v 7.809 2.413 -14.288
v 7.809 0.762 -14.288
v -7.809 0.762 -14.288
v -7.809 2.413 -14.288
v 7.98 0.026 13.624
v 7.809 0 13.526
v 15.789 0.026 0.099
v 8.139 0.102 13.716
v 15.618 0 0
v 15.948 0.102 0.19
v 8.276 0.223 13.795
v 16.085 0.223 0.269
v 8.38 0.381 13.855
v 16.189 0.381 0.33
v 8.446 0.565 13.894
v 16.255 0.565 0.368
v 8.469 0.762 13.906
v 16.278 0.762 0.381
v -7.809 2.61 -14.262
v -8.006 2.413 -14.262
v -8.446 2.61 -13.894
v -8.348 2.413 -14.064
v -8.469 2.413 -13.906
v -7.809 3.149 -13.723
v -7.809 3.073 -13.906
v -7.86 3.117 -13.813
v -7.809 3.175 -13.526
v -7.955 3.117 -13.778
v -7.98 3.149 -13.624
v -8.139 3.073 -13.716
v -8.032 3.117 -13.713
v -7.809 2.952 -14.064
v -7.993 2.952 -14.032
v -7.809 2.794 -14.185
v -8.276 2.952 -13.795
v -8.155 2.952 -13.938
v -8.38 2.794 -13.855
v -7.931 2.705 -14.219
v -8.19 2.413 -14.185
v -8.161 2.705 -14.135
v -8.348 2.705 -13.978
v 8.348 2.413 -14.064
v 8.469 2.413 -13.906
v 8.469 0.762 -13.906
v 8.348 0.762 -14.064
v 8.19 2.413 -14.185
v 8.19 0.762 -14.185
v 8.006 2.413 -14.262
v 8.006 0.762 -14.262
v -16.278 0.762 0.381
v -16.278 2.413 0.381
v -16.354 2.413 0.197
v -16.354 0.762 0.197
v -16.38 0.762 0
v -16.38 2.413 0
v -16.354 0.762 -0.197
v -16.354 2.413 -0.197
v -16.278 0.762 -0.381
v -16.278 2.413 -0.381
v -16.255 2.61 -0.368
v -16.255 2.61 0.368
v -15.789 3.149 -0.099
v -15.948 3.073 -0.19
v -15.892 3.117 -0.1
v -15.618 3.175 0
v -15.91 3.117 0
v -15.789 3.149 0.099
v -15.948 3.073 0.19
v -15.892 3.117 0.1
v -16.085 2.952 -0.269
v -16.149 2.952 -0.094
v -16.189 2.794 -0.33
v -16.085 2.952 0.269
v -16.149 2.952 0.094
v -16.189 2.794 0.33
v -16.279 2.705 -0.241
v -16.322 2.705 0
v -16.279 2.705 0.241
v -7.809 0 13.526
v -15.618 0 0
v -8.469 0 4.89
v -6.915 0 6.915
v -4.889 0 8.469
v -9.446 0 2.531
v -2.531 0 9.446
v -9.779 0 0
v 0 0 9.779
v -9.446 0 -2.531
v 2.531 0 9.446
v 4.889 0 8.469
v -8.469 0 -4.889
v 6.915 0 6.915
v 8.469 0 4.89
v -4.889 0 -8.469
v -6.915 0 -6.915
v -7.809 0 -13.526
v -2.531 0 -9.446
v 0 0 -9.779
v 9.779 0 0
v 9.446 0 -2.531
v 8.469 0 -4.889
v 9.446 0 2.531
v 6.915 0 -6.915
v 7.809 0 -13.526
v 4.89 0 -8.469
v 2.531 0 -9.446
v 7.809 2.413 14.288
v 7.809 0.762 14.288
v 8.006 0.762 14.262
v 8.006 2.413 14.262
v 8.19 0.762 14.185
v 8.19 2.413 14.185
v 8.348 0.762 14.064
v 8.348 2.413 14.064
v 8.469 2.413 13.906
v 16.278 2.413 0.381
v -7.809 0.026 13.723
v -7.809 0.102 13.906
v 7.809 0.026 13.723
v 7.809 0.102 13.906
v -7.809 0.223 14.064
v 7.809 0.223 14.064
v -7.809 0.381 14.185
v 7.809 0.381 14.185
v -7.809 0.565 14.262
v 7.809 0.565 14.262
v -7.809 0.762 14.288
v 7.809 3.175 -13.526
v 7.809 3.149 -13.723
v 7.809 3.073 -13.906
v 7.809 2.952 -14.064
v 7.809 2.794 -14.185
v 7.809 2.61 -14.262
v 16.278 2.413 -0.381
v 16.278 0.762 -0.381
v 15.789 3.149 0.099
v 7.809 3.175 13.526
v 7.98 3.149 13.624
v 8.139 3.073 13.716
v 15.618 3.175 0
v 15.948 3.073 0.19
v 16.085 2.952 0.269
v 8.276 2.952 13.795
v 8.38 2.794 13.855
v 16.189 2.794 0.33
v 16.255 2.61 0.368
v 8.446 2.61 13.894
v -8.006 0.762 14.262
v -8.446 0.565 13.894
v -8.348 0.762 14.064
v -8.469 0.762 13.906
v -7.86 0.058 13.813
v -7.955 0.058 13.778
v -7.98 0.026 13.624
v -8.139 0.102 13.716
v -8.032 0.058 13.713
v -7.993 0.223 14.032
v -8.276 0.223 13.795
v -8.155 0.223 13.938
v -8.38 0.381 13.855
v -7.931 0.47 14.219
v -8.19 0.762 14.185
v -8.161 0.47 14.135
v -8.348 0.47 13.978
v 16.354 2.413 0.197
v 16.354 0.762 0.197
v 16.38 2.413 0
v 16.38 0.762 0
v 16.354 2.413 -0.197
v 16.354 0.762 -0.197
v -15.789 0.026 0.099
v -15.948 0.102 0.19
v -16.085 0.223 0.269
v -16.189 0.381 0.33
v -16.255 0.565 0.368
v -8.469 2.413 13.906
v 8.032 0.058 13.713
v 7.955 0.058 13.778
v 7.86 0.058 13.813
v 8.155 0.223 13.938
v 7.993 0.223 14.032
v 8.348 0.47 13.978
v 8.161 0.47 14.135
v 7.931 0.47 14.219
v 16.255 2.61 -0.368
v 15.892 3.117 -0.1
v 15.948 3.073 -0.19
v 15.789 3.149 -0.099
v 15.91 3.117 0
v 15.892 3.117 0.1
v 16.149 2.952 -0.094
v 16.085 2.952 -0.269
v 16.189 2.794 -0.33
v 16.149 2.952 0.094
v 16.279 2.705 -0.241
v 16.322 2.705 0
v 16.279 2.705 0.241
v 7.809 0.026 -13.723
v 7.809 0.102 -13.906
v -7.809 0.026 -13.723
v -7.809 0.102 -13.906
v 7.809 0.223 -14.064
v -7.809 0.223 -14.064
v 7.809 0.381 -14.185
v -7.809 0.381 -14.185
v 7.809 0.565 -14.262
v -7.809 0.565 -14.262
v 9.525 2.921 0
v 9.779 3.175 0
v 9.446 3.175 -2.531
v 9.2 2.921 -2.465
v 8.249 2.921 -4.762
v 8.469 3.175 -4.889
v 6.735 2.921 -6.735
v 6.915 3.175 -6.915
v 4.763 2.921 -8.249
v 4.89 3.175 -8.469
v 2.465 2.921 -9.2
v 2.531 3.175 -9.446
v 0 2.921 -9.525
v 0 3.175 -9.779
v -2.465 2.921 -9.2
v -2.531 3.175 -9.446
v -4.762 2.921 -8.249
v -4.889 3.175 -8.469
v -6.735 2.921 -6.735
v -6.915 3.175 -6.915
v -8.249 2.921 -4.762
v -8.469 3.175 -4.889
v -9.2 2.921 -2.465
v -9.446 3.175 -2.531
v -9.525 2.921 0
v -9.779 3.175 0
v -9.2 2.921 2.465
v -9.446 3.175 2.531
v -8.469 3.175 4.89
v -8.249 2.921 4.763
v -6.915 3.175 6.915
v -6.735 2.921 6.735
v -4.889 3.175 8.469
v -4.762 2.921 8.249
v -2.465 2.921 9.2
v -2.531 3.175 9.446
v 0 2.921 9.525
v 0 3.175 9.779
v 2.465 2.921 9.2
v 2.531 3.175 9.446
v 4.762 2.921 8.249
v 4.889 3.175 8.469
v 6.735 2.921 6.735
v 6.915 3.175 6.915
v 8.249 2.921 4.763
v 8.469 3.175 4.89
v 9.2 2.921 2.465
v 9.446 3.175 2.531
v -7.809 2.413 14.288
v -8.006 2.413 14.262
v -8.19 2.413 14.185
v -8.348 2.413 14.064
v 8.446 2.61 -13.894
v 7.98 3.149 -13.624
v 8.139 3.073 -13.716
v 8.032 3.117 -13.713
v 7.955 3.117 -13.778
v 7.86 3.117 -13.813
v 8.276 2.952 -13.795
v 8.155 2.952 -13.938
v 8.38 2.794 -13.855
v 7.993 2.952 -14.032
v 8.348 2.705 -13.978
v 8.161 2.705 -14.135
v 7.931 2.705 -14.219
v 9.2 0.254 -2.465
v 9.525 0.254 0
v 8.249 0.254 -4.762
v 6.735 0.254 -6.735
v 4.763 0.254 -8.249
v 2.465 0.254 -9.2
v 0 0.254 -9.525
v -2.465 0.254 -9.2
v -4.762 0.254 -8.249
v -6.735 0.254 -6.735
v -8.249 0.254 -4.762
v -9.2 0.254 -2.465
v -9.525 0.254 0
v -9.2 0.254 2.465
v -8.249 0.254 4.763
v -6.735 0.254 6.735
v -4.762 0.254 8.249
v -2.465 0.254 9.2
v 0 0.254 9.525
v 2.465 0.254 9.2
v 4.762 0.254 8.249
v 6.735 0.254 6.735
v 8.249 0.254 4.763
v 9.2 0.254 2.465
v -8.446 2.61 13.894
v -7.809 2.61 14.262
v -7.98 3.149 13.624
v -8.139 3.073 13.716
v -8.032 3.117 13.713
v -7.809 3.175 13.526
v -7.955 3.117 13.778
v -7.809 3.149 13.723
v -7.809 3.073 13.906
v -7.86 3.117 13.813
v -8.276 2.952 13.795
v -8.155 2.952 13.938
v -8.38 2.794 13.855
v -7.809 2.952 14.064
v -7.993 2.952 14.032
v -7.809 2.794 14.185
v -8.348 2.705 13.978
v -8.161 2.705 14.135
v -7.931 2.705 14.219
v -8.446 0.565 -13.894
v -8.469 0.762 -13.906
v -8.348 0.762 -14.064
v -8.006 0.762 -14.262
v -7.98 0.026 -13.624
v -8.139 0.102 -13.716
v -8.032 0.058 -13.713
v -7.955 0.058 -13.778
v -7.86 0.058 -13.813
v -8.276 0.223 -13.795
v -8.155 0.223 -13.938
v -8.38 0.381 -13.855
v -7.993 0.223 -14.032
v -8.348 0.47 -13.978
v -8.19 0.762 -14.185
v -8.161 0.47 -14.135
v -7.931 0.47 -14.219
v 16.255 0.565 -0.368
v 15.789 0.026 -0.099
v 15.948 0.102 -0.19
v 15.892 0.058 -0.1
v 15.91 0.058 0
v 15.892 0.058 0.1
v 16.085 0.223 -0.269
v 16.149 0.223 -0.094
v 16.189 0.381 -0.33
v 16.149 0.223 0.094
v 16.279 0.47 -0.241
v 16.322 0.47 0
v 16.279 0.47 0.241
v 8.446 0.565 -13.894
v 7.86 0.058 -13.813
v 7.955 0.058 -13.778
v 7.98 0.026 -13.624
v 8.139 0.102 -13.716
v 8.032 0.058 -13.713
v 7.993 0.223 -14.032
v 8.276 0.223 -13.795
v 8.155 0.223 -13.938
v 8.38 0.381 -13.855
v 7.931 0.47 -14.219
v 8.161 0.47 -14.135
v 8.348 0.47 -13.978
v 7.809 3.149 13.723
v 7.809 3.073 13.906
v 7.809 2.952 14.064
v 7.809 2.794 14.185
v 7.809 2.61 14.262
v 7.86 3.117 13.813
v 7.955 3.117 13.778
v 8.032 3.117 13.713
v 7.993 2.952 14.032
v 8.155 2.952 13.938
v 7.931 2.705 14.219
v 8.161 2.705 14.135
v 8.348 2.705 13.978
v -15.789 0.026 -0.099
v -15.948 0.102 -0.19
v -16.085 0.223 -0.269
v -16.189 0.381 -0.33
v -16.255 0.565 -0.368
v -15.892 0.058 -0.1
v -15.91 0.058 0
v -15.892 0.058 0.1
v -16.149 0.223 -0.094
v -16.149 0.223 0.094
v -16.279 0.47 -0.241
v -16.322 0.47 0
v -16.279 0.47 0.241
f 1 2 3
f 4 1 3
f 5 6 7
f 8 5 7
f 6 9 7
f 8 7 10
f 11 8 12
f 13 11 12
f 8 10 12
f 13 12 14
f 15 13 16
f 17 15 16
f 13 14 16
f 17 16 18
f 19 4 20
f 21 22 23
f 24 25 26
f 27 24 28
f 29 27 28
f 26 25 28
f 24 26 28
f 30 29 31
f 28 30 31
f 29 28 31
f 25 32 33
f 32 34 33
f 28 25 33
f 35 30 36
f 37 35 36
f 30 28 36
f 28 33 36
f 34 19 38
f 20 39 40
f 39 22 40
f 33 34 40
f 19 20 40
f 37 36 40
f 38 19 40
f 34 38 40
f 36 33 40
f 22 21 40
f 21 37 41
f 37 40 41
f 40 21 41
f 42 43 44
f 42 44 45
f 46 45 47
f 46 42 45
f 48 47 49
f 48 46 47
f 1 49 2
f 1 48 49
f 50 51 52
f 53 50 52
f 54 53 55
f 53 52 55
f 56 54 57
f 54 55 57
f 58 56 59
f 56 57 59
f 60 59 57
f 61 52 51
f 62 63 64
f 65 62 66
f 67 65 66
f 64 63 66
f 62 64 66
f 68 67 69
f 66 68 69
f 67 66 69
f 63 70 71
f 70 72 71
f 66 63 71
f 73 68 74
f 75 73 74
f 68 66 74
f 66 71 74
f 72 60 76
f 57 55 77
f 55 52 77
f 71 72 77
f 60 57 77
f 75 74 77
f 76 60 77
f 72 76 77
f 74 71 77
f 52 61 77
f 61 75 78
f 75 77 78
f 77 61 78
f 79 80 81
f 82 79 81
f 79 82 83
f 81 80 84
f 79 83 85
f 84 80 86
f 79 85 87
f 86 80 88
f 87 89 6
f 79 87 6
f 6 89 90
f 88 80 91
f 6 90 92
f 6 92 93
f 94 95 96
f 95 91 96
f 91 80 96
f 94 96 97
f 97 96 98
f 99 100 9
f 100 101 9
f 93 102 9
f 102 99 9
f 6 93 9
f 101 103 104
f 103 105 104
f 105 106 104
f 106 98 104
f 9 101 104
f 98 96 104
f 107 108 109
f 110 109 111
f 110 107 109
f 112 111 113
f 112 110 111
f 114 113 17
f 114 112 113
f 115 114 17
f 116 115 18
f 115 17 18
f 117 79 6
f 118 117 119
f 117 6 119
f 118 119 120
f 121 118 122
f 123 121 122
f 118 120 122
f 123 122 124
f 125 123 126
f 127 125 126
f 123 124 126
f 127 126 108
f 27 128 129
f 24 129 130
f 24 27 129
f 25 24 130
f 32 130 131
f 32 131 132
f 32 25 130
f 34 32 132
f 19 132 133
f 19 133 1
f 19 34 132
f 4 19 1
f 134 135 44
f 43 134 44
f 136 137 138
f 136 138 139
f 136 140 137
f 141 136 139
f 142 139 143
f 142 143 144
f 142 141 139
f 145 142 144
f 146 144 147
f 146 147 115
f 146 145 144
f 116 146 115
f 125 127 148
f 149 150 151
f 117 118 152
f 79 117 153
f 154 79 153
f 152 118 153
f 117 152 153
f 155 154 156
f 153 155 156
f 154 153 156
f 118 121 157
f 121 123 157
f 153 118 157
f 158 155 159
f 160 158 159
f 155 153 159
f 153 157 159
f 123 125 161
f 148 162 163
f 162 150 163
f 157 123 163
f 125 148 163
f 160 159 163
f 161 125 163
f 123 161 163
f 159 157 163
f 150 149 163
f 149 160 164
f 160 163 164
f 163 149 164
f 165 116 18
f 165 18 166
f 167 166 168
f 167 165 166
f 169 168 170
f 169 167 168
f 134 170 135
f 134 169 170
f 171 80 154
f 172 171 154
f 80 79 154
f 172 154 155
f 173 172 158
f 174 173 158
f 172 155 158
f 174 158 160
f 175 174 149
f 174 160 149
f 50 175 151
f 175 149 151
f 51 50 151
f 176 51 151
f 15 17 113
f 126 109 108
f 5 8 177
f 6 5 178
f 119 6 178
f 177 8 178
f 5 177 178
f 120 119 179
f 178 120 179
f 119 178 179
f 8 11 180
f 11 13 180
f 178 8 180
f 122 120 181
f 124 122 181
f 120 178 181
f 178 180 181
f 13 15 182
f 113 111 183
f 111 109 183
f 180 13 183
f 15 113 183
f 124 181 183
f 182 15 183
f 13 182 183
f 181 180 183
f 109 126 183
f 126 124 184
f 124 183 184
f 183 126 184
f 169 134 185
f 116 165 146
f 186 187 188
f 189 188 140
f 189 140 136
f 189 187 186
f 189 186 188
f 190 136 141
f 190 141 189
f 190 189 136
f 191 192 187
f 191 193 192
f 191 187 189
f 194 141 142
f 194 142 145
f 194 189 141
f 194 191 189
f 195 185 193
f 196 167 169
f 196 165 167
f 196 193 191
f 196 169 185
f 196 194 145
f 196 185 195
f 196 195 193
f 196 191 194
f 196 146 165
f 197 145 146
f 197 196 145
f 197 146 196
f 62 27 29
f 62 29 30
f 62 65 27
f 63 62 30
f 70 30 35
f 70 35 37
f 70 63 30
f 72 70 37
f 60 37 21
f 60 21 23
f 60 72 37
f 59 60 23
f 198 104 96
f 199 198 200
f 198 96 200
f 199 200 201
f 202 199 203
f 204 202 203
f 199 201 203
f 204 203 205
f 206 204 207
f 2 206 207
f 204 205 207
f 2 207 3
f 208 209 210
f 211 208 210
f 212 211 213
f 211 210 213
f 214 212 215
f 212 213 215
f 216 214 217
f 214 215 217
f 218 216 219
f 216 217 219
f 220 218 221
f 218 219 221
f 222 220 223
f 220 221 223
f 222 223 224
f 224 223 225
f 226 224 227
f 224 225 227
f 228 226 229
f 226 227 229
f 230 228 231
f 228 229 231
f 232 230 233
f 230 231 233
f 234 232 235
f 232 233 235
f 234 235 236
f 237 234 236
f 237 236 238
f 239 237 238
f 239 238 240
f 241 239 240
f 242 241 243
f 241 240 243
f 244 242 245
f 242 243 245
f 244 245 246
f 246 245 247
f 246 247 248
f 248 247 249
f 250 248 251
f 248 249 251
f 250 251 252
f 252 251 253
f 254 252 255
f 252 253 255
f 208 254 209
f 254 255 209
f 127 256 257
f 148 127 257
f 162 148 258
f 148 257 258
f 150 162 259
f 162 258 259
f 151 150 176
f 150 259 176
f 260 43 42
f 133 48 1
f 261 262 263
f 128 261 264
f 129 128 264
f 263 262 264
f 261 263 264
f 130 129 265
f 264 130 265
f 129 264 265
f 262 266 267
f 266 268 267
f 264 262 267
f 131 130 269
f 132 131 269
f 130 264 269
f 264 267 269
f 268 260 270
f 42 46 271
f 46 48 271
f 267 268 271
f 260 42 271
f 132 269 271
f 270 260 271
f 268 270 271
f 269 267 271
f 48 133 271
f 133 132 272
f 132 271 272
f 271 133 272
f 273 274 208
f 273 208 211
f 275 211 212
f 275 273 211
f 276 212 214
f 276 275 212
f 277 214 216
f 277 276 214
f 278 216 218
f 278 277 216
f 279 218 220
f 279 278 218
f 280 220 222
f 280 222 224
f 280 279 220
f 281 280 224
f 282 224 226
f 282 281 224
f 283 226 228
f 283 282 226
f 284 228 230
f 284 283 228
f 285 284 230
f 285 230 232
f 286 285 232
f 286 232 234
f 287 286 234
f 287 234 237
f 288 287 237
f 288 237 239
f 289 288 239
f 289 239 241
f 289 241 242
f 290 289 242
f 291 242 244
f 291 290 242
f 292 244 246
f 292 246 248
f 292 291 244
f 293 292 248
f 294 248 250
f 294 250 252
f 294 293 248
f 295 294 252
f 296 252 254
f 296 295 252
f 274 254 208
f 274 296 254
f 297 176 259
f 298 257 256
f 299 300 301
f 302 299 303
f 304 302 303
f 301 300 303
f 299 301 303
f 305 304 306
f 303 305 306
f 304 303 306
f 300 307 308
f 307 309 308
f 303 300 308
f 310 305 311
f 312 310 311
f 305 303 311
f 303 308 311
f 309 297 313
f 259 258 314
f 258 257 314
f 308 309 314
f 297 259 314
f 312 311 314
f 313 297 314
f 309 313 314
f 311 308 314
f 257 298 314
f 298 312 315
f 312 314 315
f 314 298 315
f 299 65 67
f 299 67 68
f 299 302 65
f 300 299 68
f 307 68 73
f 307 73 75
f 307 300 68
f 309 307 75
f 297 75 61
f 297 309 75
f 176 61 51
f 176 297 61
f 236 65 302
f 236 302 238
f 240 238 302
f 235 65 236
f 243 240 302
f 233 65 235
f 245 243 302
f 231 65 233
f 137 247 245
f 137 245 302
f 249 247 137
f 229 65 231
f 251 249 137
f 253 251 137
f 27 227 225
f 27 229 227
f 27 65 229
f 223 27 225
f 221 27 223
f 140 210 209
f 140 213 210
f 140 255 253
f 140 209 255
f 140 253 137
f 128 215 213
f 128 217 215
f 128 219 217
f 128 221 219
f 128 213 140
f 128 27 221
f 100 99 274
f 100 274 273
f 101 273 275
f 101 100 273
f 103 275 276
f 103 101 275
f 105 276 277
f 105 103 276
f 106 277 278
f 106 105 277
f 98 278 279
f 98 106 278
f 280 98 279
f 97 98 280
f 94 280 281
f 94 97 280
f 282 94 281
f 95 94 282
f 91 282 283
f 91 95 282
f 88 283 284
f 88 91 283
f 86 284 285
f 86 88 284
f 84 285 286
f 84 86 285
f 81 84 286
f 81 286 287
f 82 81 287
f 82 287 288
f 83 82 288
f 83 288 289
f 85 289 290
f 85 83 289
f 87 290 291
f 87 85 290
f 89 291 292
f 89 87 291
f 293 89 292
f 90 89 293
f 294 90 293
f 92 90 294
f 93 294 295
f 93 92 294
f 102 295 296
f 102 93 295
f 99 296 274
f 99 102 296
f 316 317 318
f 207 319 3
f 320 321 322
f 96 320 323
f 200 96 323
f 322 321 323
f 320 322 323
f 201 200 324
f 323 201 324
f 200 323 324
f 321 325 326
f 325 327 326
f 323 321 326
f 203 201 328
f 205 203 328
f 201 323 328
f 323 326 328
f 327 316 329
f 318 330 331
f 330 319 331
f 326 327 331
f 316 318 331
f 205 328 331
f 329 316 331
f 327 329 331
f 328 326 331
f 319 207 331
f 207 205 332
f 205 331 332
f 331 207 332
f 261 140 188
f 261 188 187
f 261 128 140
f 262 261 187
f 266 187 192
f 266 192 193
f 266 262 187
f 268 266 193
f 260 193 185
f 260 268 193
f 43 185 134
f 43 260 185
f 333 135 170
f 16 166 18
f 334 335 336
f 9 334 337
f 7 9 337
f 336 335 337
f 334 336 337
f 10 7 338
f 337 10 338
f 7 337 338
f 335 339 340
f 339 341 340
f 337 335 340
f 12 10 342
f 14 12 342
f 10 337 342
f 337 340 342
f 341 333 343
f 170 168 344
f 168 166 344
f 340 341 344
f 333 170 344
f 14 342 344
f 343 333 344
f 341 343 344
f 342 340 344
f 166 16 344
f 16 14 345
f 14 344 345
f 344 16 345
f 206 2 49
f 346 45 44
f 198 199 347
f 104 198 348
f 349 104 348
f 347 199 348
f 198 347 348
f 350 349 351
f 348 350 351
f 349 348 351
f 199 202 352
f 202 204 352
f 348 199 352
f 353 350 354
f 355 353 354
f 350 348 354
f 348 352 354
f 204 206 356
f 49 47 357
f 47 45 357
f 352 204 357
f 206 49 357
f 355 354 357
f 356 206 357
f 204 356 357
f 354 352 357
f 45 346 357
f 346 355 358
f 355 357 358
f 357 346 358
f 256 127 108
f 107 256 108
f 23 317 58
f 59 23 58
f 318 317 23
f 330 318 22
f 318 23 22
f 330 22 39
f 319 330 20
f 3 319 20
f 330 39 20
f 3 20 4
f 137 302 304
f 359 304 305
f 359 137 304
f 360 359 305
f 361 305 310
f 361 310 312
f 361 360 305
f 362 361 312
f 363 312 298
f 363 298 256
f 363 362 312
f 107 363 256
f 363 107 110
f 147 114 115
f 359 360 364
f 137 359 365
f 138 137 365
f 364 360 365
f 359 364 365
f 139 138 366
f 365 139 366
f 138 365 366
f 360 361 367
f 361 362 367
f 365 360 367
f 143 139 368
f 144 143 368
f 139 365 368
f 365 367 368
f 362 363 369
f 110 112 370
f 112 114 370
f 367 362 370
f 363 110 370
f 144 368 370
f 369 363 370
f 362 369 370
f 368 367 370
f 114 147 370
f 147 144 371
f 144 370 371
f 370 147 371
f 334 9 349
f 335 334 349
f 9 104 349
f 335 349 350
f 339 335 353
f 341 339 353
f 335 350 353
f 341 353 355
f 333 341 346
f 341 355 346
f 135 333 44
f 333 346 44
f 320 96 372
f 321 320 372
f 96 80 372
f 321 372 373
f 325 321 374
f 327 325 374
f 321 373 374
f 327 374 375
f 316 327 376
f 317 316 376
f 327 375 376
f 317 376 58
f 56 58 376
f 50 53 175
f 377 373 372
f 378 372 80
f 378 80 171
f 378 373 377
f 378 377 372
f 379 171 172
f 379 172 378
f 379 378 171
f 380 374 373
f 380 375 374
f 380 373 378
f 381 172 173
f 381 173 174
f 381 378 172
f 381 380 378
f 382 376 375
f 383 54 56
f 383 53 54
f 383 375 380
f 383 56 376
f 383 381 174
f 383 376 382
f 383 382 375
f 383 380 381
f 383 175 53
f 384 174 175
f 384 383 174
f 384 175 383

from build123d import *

# Parameters (mm, degrees)
SKETCH1_R           = 9.525
BOSS_EXTRUDE1_DEPTH = 3.175
CHAMFER1_SIZE       = 0.254
FILLET1_R           = 0.762


with BuildPart() as part:
    # Sketch1 → Boss-Extrude1 (new body)
    with BuildSketch(Plane(origin=(0, 0, 0), x_dir=(1, 0, 0), z_dir=(0, 1, 0))):
        Polygon((-8.248891971, -14.2875), (8.248891971, -14.2875), (16.497783942, 0), (8.248891971, 14.2875), (-8.248891971, 14.2875), (-16.497783942, 0), align=None)
        Circle(SKETCH1_R, mode=Mode.SUBTRACT)
    extrude(amount=BOSS_EXTRUDE1_DEPTH)

    # Chamfer1
    chamfer1_edges = [part.edges().sort_by_distance(p)[0] for p in [
        (-9.525, 0, 0),
        (-9.525, 3.175, 0),
    ]]
    chamfer(chamfer1_edges, length=CHAMFER1_SIZE)

    # Fillet1
    fillet1_edges = [part.edges().sort_by_distance(p)[0] for p in [
        (12.373337957, 3.175, 7.14375),
        (-16.497783942, 1.5875, 0),
        (-8.248891971, 1.5875, -14.2875),
        (8.248891971, 1.5875, -14.2875),
        (16.497783942, 1.5875, 0),
        (8.248891971, 1.5875, 14.2875),
        (-8.248891971, 1.5875, 14.2875),
        (12.373337957, 3.175, -7.14375),
        (0, 3.175, -14.2875),
        (-12.373337957, 3.175, -7.14375),
        (-12.373337957, 3.175, 7.14375),
        (-12.373337957, 0, -7.14375),
        (0, 0, -14.2875),
        (12.373337957, 0, -7.14375),
        (0, 3.175, 14.2875),
        (12.373337957, 0, 7.14375),
        (0, 0, 14.2875),
        (-12.373337957, 0, 7.14375),
    ]]
    fillet(fillet1_edges, radius=FILLET1_R)


solid = part.part
